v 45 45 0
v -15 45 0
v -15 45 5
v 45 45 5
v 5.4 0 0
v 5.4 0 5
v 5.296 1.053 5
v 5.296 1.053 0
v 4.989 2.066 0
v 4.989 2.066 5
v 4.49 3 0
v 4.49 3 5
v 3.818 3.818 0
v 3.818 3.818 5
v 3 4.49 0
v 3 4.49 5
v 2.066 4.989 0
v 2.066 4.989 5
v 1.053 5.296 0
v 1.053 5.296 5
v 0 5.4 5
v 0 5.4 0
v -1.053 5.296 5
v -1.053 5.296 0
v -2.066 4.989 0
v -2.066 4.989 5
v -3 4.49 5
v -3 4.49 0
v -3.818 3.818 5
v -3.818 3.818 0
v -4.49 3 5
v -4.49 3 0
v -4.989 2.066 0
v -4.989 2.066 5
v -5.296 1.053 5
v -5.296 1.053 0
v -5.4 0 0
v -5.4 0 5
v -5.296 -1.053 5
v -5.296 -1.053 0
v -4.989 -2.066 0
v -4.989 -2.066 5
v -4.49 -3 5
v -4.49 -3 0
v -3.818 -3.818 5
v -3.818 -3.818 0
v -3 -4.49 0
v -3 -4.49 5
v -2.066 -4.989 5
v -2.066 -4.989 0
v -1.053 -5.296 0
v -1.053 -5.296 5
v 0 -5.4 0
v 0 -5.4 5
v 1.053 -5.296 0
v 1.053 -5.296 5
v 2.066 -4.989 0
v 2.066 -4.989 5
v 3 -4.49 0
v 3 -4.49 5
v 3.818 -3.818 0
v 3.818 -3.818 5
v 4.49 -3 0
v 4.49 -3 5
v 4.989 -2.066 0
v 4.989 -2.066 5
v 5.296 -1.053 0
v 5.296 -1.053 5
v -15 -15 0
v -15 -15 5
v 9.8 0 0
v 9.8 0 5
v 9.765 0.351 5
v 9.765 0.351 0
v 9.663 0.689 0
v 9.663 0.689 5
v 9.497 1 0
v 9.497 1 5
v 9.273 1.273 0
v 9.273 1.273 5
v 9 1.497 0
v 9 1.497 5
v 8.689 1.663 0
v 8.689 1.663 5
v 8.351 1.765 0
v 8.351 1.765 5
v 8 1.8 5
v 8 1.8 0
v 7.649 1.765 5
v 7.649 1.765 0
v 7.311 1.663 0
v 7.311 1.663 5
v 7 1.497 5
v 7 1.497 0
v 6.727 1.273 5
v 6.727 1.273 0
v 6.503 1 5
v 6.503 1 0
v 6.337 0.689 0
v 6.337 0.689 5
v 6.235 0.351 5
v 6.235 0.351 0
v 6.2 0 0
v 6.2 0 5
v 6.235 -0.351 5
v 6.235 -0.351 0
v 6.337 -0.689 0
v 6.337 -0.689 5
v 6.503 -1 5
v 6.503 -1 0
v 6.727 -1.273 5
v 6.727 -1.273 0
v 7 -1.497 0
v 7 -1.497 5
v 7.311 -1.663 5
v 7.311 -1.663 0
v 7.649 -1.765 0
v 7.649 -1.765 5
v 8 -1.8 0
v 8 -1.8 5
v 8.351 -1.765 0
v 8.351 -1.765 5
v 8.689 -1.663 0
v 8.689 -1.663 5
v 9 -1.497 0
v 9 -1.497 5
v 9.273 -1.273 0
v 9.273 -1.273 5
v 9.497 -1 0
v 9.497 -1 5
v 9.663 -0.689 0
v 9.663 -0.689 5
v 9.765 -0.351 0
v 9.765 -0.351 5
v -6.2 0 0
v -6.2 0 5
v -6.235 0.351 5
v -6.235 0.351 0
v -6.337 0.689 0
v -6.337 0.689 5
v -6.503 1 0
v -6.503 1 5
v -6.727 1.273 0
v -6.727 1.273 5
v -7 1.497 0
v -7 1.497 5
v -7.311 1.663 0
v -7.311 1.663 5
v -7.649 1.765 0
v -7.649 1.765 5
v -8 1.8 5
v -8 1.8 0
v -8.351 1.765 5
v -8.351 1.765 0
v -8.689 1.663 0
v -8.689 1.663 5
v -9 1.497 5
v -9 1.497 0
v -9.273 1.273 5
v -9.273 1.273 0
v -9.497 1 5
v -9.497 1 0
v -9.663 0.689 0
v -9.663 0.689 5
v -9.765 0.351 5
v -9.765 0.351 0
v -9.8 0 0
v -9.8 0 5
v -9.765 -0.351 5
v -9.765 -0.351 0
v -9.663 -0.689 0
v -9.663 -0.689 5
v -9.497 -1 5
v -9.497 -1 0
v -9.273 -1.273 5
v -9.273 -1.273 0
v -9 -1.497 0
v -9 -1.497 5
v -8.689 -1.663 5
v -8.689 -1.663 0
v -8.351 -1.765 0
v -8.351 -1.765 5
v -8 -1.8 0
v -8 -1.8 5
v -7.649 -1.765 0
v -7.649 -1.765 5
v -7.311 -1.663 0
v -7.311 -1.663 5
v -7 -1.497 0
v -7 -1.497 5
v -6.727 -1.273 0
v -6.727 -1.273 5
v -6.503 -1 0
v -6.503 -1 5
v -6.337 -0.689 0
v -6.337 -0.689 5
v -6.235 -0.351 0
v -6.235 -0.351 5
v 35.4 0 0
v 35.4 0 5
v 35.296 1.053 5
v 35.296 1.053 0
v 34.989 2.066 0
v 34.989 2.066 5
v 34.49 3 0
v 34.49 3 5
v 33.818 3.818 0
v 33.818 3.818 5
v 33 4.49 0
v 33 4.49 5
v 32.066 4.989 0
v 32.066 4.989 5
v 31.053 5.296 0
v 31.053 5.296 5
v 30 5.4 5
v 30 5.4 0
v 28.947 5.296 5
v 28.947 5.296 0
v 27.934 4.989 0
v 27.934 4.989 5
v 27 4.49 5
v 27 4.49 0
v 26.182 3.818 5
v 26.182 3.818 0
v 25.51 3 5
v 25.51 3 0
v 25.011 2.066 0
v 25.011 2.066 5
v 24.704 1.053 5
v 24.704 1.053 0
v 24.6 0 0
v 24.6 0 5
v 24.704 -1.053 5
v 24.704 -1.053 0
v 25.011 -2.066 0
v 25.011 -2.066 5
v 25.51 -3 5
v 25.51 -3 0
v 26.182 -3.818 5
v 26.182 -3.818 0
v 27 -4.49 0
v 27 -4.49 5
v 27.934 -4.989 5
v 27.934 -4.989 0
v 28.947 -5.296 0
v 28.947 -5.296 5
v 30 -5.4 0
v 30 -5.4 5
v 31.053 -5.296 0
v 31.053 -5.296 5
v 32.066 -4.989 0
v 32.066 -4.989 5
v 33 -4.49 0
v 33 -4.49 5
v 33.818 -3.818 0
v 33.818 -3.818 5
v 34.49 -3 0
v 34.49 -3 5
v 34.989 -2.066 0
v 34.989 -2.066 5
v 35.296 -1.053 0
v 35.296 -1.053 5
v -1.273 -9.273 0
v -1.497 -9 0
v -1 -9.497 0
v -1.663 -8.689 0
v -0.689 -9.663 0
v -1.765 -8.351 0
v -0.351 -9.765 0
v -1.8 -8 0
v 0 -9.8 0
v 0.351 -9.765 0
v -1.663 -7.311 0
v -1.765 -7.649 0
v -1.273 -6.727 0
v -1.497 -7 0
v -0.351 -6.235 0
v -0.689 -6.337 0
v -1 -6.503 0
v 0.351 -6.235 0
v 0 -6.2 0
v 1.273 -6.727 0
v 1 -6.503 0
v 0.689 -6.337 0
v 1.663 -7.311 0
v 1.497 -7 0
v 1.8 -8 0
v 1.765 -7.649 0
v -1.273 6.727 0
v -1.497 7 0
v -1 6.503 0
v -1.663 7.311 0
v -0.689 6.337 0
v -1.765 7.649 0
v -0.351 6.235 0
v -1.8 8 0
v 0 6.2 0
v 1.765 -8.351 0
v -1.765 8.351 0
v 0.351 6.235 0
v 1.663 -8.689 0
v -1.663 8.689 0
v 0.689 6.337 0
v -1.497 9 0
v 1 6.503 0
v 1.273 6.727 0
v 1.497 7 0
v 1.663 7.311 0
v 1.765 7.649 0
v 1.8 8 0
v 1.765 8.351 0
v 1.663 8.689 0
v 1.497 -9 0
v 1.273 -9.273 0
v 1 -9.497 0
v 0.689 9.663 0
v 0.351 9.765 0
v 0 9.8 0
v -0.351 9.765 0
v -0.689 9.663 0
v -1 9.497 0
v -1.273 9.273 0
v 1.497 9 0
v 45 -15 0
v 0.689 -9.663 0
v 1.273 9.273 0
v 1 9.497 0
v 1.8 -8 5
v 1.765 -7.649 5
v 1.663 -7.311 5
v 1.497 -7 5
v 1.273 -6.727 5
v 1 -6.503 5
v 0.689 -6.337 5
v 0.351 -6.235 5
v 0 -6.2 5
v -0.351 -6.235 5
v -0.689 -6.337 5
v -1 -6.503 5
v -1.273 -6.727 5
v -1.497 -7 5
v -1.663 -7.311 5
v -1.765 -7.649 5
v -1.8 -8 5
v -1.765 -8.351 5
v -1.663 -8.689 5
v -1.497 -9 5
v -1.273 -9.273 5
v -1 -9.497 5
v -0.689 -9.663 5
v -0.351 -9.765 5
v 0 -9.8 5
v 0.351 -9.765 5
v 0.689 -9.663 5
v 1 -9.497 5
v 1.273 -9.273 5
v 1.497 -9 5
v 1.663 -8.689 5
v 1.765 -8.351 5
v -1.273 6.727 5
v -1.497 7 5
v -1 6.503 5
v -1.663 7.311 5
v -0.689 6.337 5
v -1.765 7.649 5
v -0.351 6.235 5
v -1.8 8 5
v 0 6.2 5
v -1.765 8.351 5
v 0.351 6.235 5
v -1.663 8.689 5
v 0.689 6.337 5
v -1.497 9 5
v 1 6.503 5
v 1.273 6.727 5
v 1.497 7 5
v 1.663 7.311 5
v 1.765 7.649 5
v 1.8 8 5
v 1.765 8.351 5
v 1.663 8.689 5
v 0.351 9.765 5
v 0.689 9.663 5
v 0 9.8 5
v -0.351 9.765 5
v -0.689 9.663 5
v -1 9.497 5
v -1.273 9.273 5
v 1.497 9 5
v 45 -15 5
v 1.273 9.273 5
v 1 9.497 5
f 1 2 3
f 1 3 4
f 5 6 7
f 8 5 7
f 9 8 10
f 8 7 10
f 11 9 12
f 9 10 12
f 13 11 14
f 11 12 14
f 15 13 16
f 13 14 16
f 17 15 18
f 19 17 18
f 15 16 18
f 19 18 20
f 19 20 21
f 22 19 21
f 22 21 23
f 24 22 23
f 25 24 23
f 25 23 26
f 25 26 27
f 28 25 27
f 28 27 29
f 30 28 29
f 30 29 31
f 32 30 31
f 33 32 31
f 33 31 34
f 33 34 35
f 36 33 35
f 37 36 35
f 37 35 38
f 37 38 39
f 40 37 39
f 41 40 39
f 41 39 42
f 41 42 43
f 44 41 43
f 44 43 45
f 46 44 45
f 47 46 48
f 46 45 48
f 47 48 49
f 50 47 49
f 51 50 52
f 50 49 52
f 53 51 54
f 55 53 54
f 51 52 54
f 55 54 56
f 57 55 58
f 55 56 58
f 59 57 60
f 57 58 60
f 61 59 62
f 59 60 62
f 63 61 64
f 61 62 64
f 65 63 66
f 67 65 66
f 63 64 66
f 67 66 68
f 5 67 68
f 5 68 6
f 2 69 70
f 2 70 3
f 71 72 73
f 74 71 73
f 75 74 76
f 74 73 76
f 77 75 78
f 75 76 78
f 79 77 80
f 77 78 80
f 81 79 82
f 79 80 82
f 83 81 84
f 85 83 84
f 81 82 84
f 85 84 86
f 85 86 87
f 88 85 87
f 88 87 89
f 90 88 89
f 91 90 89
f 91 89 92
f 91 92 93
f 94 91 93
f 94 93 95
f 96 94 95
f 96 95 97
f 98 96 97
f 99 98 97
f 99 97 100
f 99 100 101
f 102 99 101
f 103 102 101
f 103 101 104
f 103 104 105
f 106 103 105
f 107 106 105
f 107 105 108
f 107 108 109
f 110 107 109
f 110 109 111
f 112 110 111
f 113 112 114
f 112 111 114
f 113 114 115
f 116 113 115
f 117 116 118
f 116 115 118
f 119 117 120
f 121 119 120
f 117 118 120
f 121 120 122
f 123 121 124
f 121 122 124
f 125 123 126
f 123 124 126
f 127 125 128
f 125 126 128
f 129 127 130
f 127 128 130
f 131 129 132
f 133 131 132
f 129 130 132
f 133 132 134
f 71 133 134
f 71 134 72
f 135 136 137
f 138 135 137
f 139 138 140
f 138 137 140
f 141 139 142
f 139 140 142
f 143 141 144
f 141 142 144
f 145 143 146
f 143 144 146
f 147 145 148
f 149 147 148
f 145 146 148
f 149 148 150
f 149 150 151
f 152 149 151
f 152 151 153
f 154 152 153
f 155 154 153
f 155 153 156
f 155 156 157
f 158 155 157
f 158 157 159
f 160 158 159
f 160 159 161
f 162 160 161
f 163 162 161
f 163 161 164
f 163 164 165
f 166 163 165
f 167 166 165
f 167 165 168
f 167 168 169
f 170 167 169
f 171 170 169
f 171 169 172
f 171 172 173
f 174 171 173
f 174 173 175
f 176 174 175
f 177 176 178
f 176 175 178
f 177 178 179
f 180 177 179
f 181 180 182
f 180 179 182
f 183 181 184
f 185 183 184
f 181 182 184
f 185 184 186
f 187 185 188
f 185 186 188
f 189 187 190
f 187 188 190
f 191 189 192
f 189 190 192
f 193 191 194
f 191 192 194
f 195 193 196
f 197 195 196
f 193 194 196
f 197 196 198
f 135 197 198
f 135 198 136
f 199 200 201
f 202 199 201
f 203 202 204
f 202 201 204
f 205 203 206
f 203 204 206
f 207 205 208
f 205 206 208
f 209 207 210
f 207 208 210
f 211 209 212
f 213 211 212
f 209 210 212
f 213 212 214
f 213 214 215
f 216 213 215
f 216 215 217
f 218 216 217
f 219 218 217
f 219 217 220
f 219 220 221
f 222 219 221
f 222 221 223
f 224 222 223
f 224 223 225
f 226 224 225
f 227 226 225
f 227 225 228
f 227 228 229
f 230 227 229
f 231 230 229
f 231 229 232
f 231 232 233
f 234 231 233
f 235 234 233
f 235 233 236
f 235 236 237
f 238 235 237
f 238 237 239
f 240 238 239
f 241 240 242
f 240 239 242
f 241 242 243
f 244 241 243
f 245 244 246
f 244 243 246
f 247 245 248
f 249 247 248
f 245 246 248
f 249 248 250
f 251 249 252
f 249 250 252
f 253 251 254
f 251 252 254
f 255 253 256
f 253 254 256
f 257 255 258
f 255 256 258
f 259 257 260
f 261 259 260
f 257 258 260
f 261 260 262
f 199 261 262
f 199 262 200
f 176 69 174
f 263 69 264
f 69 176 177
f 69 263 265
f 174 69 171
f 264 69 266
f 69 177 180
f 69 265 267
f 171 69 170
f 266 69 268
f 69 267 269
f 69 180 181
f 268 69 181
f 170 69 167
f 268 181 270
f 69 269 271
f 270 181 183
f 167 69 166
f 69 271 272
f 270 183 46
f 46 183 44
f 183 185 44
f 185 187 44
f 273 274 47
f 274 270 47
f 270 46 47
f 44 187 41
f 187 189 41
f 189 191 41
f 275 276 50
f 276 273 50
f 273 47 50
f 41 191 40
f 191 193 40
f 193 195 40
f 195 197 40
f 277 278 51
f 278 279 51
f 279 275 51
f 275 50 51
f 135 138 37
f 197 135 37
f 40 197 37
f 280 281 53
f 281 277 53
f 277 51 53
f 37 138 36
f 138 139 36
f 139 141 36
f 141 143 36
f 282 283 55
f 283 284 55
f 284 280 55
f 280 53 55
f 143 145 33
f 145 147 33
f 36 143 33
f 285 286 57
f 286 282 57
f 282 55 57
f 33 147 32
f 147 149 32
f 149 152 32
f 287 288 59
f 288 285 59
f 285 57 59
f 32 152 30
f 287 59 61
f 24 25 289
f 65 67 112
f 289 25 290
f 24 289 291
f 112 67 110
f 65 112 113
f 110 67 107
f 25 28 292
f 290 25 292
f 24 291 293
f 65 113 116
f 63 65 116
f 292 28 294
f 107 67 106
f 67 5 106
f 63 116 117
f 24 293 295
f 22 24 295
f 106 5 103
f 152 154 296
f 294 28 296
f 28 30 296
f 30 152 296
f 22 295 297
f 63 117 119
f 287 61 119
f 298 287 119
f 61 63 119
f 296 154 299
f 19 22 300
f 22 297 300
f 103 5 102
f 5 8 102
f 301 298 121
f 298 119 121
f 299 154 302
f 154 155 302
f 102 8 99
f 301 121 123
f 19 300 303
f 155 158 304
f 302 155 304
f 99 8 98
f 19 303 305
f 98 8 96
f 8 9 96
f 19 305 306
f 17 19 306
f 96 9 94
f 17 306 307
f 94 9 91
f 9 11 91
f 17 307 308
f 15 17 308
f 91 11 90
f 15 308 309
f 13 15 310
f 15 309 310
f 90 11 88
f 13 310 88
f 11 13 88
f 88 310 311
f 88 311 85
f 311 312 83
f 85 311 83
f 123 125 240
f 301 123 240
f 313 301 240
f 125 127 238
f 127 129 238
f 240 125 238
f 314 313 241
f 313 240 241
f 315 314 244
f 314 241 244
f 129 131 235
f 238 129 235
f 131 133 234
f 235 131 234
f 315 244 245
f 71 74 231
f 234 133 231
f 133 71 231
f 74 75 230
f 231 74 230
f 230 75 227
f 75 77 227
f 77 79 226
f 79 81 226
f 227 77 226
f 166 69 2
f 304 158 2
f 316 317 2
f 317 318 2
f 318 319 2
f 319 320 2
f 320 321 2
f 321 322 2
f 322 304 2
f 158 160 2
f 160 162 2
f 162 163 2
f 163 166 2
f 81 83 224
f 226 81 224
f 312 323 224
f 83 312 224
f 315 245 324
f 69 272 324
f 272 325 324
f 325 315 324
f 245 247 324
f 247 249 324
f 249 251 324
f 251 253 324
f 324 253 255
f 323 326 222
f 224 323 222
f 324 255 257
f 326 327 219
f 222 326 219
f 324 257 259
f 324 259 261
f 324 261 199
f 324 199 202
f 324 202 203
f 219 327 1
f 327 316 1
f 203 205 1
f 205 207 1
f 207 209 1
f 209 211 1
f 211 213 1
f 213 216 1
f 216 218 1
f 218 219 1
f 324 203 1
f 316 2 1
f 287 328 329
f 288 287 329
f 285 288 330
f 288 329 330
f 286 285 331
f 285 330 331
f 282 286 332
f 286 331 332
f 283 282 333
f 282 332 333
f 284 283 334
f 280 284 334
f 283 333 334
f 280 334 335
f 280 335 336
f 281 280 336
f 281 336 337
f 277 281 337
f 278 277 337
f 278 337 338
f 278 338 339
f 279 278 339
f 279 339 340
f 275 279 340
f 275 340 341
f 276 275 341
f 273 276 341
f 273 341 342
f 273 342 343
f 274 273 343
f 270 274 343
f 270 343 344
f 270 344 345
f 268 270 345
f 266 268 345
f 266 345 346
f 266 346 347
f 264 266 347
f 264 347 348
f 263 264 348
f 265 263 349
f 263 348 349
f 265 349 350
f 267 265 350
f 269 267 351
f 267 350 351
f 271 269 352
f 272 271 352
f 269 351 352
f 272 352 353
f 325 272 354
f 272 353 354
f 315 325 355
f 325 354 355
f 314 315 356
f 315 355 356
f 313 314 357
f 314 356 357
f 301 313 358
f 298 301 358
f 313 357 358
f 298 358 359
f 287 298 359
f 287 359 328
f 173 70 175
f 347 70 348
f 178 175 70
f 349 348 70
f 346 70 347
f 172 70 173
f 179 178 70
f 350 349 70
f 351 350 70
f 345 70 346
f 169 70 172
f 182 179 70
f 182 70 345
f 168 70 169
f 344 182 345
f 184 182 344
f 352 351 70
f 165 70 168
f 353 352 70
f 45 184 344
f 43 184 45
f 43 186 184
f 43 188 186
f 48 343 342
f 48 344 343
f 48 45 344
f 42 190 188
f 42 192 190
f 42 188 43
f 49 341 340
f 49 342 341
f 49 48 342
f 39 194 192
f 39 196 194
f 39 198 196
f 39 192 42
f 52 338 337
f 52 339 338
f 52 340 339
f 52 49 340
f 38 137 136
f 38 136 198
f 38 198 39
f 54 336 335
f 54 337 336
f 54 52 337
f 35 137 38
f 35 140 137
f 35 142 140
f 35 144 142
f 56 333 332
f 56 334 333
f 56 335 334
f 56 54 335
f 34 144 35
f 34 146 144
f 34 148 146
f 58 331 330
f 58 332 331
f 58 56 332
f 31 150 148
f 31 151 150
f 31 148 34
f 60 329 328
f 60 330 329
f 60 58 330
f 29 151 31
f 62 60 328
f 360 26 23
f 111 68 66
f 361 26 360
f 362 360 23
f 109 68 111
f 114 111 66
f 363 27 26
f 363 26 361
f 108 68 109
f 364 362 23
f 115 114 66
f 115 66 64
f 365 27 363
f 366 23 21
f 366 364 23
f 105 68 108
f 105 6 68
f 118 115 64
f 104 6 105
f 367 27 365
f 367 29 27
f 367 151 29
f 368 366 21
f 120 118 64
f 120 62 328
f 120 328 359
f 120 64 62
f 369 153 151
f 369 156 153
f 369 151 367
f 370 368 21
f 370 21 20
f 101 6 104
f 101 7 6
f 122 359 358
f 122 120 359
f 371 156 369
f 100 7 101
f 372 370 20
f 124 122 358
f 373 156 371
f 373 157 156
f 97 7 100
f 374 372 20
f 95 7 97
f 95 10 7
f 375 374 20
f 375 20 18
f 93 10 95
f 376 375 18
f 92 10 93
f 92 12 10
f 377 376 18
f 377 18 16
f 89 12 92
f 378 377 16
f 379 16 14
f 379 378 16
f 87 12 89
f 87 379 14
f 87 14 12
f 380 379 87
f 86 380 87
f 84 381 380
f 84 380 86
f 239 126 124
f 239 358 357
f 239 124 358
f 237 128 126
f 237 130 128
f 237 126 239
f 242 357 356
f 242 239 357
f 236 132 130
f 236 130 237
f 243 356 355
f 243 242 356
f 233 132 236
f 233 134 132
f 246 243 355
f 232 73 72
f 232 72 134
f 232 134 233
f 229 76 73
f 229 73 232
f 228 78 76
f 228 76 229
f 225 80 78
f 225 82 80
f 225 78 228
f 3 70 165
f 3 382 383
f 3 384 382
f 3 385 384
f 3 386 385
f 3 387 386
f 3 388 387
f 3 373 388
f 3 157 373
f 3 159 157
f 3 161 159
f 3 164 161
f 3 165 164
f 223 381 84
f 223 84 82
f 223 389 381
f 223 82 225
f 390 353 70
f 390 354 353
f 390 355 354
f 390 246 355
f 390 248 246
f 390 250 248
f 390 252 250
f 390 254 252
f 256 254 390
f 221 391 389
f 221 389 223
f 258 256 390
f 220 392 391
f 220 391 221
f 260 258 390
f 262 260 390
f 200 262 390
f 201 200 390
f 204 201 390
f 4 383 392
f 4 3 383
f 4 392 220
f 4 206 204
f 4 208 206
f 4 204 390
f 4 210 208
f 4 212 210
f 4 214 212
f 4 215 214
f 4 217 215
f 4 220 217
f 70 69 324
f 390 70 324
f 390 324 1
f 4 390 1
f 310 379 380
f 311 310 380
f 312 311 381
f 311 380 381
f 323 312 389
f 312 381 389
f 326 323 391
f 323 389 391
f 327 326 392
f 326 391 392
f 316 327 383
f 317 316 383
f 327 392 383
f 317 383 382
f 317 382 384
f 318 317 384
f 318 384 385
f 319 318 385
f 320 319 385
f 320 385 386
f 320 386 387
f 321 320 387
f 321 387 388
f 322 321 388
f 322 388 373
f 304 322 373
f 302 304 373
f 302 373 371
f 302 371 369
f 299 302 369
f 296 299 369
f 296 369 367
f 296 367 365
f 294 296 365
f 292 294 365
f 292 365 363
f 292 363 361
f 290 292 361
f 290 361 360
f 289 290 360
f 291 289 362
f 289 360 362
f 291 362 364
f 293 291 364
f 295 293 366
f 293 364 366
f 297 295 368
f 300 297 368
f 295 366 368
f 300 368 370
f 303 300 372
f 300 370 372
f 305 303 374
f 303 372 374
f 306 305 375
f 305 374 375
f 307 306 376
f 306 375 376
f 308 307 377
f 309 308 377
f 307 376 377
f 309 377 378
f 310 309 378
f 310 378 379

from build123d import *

# Parameters (mm, degrees)
SKETCH_W      = 60
SKETCH_H      = 60
PAD_DEPTH     = 5
SKETCH001_R   = 1.8
SKETCH001_R_2 = 5.4
POCKET_DEPTH  = 15


with BuildPart() as part:
    # Sketch → Pad (new body)
    with BuildSketch(Plane.XY):
        with Locations((15, 15)):
            Rectangle(SKETCH_W, SKETCH_H)
    extrude(amount=PAD_DEPTH)

    # Sketch001 (on Face6 of Pad) → Pocket (cut)
    with BuildSketch(Plane.XY.offset(5)):
        with Locations((-8, 0)):
            Circle(SKETCH001_R)
        with Locations((0, -8)):
            Circle(SKETCH001_R)
        with Locations((0, 8)):
            Circle(SKETCH001_R)
        with Locations((8, 0)):
            Circle(SKETCH001_R)
        Circle(SKETCH001_R_2)
        with Locations((30, 0)):
            Circle(SKETCH001_R_2)
    extrude(amount=-POCKET_DEPTH, mode=Mode.SUBTRACT)


solid = part.part
